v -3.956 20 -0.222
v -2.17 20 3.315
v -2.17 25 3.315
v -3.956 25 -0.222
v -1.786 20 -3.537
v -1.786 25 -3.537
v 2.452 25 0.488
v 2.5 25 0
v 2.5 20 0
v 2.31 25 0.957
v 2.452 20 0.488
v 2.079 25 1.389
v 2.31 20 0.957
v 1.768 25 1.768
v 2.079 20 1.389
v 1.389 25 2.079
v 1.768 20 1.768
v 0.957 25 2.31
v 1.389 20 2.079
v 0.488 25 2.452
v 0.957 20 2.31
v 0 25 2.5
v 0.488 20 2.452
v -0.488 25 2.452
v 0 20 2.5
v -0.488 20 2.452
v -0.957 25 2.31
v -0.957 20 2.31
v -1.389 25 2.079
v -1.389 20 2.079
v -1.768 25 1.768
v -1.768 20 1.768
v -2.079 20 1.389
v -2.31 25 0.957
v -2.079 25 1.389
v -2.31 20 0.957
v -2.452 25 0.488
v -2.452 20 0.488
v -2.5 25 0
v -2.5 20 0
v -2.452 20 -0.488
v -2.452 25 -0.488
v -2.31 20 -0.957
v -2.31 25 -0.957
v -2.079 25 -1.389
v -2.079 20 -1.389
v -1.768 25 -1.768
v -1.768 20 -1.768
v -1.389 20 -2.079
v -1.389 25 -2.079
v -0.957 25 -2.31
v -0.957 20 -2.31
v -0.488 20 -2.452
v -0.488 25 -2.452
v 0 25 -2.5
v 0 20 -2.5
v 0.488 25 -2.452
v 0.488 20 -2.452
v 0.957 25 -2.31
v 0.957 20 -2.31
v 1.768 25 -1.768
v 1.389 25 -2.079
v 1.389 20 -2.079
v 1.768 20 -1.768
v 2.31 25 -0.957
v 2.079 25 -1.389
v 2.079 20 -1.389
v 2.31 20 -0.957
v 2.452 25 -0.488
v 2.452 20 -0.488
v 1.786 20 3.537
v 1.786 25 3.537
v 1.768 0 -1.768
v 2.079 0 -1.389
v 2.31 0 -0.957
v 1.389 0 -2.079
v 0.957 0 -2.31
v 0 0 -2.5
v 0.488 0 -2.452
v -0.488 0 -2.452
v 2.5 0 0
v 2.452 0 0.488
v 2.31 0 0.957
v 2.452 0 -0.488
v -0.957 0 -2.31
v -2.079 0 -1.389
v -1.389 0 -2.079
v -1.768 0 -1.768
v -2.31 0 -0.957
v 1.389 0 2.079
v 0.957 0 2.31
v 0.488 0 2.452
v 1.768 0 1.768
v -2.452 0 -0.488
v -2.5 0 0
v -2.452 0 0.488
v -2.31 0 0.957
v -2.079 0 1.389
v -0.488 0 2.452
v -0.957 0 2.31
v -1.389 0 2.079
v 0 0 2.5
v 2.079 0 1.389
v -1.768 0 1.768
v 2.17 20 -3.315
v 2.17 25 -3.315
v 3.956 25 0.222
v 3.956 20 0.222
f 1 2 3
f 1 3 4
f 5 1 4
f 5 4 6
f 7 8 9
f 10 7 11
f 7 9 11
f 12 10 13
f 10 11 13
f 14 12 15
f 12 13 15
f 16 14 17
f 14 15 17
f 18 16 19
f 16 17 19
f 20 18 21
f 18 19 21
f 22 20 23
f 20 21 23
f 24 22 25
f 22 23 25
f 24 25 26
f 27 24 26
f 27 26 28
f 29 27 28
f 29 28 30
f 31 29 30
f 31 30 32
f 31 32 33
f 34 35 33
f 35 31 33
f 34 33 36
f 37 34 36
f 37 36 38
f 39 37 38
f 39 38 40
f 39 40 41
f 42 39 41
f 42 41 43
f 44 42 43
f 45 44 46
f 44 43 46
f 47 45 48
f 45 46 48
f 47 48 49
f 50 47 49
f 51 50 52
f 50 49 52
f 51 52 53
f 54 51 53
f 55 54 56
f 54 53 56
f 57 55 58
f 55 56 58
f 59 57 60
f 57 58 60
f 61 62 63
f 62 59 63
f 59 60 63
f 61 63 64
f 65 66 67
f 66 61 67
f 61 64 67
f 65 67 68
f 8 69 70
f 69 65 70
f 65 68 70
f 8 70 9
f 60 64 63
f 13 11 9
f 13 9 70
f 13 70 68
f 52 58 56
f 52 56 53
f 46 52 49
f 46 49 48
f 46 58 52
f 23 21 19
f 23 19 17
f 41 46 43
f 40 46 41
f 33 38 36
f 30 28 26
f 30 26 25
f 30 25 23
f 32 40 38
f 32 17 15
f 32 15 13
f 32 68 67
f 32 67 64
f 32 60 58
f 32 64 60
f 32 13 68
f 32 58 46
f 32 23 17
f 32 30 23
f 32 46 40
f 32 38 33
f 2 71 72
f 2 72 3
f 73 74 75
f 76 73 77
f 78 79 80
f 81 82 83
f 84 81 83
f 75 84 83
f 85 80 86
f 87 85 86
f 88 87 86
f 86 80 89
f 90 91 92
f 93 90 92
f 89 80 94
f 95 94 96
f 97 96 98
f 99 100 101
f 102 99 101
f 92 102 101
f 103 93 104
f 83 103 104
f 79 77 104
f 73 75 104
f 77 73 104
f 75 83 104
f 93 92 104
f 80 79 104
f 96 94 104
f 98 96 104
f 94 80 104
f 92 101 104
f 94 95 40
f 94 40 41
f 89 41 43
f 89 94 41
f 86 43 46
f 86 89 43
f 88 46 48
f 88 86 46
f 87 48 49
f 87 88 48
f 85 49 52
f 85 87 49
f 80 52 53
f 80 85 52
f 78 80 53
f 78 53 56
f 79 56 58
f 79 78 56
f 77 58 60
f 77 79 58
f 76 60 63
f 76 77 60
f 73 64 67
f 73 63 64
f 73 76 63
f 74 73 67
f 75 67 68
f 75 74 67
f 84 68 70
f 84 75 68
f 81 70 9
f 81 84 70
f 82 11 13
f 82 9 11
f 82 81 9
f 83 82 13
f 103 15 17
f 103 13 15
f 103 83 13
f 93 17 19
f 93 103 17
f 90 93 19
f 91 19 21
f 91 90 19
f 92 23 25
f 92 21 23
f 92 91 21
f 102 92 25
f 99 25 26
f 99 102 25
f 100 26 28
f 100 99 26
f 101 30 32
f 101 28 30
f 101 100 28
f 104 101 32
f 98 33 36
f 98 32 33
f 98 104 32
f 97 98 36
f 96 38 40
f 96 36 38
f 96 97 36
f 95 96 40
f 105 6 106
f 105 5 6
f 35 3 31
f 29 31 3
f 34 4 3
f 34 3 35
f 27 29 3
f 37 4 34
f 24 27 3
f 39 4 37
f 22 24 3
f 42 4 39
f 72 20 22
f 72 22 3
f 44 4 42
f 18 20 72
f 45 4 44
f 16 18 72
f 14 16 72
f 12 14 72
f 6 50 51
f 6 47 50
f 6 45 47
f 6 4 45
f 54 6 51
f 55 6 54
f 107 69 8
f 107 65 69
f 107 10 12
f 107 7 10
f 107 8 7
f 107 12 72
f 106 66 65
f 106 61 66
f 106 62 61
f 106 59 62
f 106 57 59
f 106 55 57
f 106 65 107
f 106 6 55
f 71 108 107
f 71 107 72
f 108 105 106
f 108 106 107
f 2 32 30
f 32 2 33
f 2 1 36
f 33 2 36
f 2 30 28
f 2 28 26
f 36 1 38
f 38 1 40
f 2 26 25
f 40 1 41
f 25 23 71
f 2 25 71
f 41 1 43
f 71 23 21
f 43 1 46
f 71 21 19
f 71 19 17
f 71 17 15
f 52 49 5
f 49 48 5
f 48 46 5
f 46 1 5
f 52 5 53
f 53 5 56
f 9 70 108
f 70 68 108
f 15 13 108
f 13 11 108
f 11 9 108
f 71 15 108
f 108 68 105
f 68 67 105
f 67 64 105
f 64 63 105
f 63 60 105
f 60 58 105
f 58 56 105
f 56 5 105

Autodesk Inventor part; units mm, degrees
ref_plane "YZ Plane" through (0, 0, 0) normal (1, 0, 0) x (0, 1, 0)
ref_plane "XZ Plane" through (0, 0, 0) normal (0, 1, 0) x (-1, 0, 0)
ref_plane "XY Plane" through (0, 0, 0) normal (0, 0, 1) x (1, 0, 0)
sketch "Sketch1" plane through (0, 0, 0) normal (0, 1, 0) x (-1, 0, 0)
  circle A0 centre (0, 0) radius 2.5
  dimension "d0" = 5
extrude "Extrusion1" add sketch "Sketch1" along normal blind 20
sketch "Sketch2" plane through (0, 20, 0) normal (0, 1, 0) x (1, 0, 0)
  circle A0 centre (0, 0) radius 2.5 projected
  line L0 (1.7855, -3.5367) -> (-2.1701, -3.3146)
  line L1 (-2.1701, -3.3146) -> (-3.9556, 0.222)
  line L2 (-3.9556, 0.222) -> (-1.7855, 3.5367)
  line L3 (-1.7855, 3.5367) -> (2.1701, 3.3146)
  line L4 (2.1701, 3.3146) -> (3.9556, -0.222)
  line L5 (3.9556, -0.222) -> (1.7855, -3.5367)
extrude "Extrusion2" add sketch "Sketch2" along normal blind 5
properties part number "nut"
